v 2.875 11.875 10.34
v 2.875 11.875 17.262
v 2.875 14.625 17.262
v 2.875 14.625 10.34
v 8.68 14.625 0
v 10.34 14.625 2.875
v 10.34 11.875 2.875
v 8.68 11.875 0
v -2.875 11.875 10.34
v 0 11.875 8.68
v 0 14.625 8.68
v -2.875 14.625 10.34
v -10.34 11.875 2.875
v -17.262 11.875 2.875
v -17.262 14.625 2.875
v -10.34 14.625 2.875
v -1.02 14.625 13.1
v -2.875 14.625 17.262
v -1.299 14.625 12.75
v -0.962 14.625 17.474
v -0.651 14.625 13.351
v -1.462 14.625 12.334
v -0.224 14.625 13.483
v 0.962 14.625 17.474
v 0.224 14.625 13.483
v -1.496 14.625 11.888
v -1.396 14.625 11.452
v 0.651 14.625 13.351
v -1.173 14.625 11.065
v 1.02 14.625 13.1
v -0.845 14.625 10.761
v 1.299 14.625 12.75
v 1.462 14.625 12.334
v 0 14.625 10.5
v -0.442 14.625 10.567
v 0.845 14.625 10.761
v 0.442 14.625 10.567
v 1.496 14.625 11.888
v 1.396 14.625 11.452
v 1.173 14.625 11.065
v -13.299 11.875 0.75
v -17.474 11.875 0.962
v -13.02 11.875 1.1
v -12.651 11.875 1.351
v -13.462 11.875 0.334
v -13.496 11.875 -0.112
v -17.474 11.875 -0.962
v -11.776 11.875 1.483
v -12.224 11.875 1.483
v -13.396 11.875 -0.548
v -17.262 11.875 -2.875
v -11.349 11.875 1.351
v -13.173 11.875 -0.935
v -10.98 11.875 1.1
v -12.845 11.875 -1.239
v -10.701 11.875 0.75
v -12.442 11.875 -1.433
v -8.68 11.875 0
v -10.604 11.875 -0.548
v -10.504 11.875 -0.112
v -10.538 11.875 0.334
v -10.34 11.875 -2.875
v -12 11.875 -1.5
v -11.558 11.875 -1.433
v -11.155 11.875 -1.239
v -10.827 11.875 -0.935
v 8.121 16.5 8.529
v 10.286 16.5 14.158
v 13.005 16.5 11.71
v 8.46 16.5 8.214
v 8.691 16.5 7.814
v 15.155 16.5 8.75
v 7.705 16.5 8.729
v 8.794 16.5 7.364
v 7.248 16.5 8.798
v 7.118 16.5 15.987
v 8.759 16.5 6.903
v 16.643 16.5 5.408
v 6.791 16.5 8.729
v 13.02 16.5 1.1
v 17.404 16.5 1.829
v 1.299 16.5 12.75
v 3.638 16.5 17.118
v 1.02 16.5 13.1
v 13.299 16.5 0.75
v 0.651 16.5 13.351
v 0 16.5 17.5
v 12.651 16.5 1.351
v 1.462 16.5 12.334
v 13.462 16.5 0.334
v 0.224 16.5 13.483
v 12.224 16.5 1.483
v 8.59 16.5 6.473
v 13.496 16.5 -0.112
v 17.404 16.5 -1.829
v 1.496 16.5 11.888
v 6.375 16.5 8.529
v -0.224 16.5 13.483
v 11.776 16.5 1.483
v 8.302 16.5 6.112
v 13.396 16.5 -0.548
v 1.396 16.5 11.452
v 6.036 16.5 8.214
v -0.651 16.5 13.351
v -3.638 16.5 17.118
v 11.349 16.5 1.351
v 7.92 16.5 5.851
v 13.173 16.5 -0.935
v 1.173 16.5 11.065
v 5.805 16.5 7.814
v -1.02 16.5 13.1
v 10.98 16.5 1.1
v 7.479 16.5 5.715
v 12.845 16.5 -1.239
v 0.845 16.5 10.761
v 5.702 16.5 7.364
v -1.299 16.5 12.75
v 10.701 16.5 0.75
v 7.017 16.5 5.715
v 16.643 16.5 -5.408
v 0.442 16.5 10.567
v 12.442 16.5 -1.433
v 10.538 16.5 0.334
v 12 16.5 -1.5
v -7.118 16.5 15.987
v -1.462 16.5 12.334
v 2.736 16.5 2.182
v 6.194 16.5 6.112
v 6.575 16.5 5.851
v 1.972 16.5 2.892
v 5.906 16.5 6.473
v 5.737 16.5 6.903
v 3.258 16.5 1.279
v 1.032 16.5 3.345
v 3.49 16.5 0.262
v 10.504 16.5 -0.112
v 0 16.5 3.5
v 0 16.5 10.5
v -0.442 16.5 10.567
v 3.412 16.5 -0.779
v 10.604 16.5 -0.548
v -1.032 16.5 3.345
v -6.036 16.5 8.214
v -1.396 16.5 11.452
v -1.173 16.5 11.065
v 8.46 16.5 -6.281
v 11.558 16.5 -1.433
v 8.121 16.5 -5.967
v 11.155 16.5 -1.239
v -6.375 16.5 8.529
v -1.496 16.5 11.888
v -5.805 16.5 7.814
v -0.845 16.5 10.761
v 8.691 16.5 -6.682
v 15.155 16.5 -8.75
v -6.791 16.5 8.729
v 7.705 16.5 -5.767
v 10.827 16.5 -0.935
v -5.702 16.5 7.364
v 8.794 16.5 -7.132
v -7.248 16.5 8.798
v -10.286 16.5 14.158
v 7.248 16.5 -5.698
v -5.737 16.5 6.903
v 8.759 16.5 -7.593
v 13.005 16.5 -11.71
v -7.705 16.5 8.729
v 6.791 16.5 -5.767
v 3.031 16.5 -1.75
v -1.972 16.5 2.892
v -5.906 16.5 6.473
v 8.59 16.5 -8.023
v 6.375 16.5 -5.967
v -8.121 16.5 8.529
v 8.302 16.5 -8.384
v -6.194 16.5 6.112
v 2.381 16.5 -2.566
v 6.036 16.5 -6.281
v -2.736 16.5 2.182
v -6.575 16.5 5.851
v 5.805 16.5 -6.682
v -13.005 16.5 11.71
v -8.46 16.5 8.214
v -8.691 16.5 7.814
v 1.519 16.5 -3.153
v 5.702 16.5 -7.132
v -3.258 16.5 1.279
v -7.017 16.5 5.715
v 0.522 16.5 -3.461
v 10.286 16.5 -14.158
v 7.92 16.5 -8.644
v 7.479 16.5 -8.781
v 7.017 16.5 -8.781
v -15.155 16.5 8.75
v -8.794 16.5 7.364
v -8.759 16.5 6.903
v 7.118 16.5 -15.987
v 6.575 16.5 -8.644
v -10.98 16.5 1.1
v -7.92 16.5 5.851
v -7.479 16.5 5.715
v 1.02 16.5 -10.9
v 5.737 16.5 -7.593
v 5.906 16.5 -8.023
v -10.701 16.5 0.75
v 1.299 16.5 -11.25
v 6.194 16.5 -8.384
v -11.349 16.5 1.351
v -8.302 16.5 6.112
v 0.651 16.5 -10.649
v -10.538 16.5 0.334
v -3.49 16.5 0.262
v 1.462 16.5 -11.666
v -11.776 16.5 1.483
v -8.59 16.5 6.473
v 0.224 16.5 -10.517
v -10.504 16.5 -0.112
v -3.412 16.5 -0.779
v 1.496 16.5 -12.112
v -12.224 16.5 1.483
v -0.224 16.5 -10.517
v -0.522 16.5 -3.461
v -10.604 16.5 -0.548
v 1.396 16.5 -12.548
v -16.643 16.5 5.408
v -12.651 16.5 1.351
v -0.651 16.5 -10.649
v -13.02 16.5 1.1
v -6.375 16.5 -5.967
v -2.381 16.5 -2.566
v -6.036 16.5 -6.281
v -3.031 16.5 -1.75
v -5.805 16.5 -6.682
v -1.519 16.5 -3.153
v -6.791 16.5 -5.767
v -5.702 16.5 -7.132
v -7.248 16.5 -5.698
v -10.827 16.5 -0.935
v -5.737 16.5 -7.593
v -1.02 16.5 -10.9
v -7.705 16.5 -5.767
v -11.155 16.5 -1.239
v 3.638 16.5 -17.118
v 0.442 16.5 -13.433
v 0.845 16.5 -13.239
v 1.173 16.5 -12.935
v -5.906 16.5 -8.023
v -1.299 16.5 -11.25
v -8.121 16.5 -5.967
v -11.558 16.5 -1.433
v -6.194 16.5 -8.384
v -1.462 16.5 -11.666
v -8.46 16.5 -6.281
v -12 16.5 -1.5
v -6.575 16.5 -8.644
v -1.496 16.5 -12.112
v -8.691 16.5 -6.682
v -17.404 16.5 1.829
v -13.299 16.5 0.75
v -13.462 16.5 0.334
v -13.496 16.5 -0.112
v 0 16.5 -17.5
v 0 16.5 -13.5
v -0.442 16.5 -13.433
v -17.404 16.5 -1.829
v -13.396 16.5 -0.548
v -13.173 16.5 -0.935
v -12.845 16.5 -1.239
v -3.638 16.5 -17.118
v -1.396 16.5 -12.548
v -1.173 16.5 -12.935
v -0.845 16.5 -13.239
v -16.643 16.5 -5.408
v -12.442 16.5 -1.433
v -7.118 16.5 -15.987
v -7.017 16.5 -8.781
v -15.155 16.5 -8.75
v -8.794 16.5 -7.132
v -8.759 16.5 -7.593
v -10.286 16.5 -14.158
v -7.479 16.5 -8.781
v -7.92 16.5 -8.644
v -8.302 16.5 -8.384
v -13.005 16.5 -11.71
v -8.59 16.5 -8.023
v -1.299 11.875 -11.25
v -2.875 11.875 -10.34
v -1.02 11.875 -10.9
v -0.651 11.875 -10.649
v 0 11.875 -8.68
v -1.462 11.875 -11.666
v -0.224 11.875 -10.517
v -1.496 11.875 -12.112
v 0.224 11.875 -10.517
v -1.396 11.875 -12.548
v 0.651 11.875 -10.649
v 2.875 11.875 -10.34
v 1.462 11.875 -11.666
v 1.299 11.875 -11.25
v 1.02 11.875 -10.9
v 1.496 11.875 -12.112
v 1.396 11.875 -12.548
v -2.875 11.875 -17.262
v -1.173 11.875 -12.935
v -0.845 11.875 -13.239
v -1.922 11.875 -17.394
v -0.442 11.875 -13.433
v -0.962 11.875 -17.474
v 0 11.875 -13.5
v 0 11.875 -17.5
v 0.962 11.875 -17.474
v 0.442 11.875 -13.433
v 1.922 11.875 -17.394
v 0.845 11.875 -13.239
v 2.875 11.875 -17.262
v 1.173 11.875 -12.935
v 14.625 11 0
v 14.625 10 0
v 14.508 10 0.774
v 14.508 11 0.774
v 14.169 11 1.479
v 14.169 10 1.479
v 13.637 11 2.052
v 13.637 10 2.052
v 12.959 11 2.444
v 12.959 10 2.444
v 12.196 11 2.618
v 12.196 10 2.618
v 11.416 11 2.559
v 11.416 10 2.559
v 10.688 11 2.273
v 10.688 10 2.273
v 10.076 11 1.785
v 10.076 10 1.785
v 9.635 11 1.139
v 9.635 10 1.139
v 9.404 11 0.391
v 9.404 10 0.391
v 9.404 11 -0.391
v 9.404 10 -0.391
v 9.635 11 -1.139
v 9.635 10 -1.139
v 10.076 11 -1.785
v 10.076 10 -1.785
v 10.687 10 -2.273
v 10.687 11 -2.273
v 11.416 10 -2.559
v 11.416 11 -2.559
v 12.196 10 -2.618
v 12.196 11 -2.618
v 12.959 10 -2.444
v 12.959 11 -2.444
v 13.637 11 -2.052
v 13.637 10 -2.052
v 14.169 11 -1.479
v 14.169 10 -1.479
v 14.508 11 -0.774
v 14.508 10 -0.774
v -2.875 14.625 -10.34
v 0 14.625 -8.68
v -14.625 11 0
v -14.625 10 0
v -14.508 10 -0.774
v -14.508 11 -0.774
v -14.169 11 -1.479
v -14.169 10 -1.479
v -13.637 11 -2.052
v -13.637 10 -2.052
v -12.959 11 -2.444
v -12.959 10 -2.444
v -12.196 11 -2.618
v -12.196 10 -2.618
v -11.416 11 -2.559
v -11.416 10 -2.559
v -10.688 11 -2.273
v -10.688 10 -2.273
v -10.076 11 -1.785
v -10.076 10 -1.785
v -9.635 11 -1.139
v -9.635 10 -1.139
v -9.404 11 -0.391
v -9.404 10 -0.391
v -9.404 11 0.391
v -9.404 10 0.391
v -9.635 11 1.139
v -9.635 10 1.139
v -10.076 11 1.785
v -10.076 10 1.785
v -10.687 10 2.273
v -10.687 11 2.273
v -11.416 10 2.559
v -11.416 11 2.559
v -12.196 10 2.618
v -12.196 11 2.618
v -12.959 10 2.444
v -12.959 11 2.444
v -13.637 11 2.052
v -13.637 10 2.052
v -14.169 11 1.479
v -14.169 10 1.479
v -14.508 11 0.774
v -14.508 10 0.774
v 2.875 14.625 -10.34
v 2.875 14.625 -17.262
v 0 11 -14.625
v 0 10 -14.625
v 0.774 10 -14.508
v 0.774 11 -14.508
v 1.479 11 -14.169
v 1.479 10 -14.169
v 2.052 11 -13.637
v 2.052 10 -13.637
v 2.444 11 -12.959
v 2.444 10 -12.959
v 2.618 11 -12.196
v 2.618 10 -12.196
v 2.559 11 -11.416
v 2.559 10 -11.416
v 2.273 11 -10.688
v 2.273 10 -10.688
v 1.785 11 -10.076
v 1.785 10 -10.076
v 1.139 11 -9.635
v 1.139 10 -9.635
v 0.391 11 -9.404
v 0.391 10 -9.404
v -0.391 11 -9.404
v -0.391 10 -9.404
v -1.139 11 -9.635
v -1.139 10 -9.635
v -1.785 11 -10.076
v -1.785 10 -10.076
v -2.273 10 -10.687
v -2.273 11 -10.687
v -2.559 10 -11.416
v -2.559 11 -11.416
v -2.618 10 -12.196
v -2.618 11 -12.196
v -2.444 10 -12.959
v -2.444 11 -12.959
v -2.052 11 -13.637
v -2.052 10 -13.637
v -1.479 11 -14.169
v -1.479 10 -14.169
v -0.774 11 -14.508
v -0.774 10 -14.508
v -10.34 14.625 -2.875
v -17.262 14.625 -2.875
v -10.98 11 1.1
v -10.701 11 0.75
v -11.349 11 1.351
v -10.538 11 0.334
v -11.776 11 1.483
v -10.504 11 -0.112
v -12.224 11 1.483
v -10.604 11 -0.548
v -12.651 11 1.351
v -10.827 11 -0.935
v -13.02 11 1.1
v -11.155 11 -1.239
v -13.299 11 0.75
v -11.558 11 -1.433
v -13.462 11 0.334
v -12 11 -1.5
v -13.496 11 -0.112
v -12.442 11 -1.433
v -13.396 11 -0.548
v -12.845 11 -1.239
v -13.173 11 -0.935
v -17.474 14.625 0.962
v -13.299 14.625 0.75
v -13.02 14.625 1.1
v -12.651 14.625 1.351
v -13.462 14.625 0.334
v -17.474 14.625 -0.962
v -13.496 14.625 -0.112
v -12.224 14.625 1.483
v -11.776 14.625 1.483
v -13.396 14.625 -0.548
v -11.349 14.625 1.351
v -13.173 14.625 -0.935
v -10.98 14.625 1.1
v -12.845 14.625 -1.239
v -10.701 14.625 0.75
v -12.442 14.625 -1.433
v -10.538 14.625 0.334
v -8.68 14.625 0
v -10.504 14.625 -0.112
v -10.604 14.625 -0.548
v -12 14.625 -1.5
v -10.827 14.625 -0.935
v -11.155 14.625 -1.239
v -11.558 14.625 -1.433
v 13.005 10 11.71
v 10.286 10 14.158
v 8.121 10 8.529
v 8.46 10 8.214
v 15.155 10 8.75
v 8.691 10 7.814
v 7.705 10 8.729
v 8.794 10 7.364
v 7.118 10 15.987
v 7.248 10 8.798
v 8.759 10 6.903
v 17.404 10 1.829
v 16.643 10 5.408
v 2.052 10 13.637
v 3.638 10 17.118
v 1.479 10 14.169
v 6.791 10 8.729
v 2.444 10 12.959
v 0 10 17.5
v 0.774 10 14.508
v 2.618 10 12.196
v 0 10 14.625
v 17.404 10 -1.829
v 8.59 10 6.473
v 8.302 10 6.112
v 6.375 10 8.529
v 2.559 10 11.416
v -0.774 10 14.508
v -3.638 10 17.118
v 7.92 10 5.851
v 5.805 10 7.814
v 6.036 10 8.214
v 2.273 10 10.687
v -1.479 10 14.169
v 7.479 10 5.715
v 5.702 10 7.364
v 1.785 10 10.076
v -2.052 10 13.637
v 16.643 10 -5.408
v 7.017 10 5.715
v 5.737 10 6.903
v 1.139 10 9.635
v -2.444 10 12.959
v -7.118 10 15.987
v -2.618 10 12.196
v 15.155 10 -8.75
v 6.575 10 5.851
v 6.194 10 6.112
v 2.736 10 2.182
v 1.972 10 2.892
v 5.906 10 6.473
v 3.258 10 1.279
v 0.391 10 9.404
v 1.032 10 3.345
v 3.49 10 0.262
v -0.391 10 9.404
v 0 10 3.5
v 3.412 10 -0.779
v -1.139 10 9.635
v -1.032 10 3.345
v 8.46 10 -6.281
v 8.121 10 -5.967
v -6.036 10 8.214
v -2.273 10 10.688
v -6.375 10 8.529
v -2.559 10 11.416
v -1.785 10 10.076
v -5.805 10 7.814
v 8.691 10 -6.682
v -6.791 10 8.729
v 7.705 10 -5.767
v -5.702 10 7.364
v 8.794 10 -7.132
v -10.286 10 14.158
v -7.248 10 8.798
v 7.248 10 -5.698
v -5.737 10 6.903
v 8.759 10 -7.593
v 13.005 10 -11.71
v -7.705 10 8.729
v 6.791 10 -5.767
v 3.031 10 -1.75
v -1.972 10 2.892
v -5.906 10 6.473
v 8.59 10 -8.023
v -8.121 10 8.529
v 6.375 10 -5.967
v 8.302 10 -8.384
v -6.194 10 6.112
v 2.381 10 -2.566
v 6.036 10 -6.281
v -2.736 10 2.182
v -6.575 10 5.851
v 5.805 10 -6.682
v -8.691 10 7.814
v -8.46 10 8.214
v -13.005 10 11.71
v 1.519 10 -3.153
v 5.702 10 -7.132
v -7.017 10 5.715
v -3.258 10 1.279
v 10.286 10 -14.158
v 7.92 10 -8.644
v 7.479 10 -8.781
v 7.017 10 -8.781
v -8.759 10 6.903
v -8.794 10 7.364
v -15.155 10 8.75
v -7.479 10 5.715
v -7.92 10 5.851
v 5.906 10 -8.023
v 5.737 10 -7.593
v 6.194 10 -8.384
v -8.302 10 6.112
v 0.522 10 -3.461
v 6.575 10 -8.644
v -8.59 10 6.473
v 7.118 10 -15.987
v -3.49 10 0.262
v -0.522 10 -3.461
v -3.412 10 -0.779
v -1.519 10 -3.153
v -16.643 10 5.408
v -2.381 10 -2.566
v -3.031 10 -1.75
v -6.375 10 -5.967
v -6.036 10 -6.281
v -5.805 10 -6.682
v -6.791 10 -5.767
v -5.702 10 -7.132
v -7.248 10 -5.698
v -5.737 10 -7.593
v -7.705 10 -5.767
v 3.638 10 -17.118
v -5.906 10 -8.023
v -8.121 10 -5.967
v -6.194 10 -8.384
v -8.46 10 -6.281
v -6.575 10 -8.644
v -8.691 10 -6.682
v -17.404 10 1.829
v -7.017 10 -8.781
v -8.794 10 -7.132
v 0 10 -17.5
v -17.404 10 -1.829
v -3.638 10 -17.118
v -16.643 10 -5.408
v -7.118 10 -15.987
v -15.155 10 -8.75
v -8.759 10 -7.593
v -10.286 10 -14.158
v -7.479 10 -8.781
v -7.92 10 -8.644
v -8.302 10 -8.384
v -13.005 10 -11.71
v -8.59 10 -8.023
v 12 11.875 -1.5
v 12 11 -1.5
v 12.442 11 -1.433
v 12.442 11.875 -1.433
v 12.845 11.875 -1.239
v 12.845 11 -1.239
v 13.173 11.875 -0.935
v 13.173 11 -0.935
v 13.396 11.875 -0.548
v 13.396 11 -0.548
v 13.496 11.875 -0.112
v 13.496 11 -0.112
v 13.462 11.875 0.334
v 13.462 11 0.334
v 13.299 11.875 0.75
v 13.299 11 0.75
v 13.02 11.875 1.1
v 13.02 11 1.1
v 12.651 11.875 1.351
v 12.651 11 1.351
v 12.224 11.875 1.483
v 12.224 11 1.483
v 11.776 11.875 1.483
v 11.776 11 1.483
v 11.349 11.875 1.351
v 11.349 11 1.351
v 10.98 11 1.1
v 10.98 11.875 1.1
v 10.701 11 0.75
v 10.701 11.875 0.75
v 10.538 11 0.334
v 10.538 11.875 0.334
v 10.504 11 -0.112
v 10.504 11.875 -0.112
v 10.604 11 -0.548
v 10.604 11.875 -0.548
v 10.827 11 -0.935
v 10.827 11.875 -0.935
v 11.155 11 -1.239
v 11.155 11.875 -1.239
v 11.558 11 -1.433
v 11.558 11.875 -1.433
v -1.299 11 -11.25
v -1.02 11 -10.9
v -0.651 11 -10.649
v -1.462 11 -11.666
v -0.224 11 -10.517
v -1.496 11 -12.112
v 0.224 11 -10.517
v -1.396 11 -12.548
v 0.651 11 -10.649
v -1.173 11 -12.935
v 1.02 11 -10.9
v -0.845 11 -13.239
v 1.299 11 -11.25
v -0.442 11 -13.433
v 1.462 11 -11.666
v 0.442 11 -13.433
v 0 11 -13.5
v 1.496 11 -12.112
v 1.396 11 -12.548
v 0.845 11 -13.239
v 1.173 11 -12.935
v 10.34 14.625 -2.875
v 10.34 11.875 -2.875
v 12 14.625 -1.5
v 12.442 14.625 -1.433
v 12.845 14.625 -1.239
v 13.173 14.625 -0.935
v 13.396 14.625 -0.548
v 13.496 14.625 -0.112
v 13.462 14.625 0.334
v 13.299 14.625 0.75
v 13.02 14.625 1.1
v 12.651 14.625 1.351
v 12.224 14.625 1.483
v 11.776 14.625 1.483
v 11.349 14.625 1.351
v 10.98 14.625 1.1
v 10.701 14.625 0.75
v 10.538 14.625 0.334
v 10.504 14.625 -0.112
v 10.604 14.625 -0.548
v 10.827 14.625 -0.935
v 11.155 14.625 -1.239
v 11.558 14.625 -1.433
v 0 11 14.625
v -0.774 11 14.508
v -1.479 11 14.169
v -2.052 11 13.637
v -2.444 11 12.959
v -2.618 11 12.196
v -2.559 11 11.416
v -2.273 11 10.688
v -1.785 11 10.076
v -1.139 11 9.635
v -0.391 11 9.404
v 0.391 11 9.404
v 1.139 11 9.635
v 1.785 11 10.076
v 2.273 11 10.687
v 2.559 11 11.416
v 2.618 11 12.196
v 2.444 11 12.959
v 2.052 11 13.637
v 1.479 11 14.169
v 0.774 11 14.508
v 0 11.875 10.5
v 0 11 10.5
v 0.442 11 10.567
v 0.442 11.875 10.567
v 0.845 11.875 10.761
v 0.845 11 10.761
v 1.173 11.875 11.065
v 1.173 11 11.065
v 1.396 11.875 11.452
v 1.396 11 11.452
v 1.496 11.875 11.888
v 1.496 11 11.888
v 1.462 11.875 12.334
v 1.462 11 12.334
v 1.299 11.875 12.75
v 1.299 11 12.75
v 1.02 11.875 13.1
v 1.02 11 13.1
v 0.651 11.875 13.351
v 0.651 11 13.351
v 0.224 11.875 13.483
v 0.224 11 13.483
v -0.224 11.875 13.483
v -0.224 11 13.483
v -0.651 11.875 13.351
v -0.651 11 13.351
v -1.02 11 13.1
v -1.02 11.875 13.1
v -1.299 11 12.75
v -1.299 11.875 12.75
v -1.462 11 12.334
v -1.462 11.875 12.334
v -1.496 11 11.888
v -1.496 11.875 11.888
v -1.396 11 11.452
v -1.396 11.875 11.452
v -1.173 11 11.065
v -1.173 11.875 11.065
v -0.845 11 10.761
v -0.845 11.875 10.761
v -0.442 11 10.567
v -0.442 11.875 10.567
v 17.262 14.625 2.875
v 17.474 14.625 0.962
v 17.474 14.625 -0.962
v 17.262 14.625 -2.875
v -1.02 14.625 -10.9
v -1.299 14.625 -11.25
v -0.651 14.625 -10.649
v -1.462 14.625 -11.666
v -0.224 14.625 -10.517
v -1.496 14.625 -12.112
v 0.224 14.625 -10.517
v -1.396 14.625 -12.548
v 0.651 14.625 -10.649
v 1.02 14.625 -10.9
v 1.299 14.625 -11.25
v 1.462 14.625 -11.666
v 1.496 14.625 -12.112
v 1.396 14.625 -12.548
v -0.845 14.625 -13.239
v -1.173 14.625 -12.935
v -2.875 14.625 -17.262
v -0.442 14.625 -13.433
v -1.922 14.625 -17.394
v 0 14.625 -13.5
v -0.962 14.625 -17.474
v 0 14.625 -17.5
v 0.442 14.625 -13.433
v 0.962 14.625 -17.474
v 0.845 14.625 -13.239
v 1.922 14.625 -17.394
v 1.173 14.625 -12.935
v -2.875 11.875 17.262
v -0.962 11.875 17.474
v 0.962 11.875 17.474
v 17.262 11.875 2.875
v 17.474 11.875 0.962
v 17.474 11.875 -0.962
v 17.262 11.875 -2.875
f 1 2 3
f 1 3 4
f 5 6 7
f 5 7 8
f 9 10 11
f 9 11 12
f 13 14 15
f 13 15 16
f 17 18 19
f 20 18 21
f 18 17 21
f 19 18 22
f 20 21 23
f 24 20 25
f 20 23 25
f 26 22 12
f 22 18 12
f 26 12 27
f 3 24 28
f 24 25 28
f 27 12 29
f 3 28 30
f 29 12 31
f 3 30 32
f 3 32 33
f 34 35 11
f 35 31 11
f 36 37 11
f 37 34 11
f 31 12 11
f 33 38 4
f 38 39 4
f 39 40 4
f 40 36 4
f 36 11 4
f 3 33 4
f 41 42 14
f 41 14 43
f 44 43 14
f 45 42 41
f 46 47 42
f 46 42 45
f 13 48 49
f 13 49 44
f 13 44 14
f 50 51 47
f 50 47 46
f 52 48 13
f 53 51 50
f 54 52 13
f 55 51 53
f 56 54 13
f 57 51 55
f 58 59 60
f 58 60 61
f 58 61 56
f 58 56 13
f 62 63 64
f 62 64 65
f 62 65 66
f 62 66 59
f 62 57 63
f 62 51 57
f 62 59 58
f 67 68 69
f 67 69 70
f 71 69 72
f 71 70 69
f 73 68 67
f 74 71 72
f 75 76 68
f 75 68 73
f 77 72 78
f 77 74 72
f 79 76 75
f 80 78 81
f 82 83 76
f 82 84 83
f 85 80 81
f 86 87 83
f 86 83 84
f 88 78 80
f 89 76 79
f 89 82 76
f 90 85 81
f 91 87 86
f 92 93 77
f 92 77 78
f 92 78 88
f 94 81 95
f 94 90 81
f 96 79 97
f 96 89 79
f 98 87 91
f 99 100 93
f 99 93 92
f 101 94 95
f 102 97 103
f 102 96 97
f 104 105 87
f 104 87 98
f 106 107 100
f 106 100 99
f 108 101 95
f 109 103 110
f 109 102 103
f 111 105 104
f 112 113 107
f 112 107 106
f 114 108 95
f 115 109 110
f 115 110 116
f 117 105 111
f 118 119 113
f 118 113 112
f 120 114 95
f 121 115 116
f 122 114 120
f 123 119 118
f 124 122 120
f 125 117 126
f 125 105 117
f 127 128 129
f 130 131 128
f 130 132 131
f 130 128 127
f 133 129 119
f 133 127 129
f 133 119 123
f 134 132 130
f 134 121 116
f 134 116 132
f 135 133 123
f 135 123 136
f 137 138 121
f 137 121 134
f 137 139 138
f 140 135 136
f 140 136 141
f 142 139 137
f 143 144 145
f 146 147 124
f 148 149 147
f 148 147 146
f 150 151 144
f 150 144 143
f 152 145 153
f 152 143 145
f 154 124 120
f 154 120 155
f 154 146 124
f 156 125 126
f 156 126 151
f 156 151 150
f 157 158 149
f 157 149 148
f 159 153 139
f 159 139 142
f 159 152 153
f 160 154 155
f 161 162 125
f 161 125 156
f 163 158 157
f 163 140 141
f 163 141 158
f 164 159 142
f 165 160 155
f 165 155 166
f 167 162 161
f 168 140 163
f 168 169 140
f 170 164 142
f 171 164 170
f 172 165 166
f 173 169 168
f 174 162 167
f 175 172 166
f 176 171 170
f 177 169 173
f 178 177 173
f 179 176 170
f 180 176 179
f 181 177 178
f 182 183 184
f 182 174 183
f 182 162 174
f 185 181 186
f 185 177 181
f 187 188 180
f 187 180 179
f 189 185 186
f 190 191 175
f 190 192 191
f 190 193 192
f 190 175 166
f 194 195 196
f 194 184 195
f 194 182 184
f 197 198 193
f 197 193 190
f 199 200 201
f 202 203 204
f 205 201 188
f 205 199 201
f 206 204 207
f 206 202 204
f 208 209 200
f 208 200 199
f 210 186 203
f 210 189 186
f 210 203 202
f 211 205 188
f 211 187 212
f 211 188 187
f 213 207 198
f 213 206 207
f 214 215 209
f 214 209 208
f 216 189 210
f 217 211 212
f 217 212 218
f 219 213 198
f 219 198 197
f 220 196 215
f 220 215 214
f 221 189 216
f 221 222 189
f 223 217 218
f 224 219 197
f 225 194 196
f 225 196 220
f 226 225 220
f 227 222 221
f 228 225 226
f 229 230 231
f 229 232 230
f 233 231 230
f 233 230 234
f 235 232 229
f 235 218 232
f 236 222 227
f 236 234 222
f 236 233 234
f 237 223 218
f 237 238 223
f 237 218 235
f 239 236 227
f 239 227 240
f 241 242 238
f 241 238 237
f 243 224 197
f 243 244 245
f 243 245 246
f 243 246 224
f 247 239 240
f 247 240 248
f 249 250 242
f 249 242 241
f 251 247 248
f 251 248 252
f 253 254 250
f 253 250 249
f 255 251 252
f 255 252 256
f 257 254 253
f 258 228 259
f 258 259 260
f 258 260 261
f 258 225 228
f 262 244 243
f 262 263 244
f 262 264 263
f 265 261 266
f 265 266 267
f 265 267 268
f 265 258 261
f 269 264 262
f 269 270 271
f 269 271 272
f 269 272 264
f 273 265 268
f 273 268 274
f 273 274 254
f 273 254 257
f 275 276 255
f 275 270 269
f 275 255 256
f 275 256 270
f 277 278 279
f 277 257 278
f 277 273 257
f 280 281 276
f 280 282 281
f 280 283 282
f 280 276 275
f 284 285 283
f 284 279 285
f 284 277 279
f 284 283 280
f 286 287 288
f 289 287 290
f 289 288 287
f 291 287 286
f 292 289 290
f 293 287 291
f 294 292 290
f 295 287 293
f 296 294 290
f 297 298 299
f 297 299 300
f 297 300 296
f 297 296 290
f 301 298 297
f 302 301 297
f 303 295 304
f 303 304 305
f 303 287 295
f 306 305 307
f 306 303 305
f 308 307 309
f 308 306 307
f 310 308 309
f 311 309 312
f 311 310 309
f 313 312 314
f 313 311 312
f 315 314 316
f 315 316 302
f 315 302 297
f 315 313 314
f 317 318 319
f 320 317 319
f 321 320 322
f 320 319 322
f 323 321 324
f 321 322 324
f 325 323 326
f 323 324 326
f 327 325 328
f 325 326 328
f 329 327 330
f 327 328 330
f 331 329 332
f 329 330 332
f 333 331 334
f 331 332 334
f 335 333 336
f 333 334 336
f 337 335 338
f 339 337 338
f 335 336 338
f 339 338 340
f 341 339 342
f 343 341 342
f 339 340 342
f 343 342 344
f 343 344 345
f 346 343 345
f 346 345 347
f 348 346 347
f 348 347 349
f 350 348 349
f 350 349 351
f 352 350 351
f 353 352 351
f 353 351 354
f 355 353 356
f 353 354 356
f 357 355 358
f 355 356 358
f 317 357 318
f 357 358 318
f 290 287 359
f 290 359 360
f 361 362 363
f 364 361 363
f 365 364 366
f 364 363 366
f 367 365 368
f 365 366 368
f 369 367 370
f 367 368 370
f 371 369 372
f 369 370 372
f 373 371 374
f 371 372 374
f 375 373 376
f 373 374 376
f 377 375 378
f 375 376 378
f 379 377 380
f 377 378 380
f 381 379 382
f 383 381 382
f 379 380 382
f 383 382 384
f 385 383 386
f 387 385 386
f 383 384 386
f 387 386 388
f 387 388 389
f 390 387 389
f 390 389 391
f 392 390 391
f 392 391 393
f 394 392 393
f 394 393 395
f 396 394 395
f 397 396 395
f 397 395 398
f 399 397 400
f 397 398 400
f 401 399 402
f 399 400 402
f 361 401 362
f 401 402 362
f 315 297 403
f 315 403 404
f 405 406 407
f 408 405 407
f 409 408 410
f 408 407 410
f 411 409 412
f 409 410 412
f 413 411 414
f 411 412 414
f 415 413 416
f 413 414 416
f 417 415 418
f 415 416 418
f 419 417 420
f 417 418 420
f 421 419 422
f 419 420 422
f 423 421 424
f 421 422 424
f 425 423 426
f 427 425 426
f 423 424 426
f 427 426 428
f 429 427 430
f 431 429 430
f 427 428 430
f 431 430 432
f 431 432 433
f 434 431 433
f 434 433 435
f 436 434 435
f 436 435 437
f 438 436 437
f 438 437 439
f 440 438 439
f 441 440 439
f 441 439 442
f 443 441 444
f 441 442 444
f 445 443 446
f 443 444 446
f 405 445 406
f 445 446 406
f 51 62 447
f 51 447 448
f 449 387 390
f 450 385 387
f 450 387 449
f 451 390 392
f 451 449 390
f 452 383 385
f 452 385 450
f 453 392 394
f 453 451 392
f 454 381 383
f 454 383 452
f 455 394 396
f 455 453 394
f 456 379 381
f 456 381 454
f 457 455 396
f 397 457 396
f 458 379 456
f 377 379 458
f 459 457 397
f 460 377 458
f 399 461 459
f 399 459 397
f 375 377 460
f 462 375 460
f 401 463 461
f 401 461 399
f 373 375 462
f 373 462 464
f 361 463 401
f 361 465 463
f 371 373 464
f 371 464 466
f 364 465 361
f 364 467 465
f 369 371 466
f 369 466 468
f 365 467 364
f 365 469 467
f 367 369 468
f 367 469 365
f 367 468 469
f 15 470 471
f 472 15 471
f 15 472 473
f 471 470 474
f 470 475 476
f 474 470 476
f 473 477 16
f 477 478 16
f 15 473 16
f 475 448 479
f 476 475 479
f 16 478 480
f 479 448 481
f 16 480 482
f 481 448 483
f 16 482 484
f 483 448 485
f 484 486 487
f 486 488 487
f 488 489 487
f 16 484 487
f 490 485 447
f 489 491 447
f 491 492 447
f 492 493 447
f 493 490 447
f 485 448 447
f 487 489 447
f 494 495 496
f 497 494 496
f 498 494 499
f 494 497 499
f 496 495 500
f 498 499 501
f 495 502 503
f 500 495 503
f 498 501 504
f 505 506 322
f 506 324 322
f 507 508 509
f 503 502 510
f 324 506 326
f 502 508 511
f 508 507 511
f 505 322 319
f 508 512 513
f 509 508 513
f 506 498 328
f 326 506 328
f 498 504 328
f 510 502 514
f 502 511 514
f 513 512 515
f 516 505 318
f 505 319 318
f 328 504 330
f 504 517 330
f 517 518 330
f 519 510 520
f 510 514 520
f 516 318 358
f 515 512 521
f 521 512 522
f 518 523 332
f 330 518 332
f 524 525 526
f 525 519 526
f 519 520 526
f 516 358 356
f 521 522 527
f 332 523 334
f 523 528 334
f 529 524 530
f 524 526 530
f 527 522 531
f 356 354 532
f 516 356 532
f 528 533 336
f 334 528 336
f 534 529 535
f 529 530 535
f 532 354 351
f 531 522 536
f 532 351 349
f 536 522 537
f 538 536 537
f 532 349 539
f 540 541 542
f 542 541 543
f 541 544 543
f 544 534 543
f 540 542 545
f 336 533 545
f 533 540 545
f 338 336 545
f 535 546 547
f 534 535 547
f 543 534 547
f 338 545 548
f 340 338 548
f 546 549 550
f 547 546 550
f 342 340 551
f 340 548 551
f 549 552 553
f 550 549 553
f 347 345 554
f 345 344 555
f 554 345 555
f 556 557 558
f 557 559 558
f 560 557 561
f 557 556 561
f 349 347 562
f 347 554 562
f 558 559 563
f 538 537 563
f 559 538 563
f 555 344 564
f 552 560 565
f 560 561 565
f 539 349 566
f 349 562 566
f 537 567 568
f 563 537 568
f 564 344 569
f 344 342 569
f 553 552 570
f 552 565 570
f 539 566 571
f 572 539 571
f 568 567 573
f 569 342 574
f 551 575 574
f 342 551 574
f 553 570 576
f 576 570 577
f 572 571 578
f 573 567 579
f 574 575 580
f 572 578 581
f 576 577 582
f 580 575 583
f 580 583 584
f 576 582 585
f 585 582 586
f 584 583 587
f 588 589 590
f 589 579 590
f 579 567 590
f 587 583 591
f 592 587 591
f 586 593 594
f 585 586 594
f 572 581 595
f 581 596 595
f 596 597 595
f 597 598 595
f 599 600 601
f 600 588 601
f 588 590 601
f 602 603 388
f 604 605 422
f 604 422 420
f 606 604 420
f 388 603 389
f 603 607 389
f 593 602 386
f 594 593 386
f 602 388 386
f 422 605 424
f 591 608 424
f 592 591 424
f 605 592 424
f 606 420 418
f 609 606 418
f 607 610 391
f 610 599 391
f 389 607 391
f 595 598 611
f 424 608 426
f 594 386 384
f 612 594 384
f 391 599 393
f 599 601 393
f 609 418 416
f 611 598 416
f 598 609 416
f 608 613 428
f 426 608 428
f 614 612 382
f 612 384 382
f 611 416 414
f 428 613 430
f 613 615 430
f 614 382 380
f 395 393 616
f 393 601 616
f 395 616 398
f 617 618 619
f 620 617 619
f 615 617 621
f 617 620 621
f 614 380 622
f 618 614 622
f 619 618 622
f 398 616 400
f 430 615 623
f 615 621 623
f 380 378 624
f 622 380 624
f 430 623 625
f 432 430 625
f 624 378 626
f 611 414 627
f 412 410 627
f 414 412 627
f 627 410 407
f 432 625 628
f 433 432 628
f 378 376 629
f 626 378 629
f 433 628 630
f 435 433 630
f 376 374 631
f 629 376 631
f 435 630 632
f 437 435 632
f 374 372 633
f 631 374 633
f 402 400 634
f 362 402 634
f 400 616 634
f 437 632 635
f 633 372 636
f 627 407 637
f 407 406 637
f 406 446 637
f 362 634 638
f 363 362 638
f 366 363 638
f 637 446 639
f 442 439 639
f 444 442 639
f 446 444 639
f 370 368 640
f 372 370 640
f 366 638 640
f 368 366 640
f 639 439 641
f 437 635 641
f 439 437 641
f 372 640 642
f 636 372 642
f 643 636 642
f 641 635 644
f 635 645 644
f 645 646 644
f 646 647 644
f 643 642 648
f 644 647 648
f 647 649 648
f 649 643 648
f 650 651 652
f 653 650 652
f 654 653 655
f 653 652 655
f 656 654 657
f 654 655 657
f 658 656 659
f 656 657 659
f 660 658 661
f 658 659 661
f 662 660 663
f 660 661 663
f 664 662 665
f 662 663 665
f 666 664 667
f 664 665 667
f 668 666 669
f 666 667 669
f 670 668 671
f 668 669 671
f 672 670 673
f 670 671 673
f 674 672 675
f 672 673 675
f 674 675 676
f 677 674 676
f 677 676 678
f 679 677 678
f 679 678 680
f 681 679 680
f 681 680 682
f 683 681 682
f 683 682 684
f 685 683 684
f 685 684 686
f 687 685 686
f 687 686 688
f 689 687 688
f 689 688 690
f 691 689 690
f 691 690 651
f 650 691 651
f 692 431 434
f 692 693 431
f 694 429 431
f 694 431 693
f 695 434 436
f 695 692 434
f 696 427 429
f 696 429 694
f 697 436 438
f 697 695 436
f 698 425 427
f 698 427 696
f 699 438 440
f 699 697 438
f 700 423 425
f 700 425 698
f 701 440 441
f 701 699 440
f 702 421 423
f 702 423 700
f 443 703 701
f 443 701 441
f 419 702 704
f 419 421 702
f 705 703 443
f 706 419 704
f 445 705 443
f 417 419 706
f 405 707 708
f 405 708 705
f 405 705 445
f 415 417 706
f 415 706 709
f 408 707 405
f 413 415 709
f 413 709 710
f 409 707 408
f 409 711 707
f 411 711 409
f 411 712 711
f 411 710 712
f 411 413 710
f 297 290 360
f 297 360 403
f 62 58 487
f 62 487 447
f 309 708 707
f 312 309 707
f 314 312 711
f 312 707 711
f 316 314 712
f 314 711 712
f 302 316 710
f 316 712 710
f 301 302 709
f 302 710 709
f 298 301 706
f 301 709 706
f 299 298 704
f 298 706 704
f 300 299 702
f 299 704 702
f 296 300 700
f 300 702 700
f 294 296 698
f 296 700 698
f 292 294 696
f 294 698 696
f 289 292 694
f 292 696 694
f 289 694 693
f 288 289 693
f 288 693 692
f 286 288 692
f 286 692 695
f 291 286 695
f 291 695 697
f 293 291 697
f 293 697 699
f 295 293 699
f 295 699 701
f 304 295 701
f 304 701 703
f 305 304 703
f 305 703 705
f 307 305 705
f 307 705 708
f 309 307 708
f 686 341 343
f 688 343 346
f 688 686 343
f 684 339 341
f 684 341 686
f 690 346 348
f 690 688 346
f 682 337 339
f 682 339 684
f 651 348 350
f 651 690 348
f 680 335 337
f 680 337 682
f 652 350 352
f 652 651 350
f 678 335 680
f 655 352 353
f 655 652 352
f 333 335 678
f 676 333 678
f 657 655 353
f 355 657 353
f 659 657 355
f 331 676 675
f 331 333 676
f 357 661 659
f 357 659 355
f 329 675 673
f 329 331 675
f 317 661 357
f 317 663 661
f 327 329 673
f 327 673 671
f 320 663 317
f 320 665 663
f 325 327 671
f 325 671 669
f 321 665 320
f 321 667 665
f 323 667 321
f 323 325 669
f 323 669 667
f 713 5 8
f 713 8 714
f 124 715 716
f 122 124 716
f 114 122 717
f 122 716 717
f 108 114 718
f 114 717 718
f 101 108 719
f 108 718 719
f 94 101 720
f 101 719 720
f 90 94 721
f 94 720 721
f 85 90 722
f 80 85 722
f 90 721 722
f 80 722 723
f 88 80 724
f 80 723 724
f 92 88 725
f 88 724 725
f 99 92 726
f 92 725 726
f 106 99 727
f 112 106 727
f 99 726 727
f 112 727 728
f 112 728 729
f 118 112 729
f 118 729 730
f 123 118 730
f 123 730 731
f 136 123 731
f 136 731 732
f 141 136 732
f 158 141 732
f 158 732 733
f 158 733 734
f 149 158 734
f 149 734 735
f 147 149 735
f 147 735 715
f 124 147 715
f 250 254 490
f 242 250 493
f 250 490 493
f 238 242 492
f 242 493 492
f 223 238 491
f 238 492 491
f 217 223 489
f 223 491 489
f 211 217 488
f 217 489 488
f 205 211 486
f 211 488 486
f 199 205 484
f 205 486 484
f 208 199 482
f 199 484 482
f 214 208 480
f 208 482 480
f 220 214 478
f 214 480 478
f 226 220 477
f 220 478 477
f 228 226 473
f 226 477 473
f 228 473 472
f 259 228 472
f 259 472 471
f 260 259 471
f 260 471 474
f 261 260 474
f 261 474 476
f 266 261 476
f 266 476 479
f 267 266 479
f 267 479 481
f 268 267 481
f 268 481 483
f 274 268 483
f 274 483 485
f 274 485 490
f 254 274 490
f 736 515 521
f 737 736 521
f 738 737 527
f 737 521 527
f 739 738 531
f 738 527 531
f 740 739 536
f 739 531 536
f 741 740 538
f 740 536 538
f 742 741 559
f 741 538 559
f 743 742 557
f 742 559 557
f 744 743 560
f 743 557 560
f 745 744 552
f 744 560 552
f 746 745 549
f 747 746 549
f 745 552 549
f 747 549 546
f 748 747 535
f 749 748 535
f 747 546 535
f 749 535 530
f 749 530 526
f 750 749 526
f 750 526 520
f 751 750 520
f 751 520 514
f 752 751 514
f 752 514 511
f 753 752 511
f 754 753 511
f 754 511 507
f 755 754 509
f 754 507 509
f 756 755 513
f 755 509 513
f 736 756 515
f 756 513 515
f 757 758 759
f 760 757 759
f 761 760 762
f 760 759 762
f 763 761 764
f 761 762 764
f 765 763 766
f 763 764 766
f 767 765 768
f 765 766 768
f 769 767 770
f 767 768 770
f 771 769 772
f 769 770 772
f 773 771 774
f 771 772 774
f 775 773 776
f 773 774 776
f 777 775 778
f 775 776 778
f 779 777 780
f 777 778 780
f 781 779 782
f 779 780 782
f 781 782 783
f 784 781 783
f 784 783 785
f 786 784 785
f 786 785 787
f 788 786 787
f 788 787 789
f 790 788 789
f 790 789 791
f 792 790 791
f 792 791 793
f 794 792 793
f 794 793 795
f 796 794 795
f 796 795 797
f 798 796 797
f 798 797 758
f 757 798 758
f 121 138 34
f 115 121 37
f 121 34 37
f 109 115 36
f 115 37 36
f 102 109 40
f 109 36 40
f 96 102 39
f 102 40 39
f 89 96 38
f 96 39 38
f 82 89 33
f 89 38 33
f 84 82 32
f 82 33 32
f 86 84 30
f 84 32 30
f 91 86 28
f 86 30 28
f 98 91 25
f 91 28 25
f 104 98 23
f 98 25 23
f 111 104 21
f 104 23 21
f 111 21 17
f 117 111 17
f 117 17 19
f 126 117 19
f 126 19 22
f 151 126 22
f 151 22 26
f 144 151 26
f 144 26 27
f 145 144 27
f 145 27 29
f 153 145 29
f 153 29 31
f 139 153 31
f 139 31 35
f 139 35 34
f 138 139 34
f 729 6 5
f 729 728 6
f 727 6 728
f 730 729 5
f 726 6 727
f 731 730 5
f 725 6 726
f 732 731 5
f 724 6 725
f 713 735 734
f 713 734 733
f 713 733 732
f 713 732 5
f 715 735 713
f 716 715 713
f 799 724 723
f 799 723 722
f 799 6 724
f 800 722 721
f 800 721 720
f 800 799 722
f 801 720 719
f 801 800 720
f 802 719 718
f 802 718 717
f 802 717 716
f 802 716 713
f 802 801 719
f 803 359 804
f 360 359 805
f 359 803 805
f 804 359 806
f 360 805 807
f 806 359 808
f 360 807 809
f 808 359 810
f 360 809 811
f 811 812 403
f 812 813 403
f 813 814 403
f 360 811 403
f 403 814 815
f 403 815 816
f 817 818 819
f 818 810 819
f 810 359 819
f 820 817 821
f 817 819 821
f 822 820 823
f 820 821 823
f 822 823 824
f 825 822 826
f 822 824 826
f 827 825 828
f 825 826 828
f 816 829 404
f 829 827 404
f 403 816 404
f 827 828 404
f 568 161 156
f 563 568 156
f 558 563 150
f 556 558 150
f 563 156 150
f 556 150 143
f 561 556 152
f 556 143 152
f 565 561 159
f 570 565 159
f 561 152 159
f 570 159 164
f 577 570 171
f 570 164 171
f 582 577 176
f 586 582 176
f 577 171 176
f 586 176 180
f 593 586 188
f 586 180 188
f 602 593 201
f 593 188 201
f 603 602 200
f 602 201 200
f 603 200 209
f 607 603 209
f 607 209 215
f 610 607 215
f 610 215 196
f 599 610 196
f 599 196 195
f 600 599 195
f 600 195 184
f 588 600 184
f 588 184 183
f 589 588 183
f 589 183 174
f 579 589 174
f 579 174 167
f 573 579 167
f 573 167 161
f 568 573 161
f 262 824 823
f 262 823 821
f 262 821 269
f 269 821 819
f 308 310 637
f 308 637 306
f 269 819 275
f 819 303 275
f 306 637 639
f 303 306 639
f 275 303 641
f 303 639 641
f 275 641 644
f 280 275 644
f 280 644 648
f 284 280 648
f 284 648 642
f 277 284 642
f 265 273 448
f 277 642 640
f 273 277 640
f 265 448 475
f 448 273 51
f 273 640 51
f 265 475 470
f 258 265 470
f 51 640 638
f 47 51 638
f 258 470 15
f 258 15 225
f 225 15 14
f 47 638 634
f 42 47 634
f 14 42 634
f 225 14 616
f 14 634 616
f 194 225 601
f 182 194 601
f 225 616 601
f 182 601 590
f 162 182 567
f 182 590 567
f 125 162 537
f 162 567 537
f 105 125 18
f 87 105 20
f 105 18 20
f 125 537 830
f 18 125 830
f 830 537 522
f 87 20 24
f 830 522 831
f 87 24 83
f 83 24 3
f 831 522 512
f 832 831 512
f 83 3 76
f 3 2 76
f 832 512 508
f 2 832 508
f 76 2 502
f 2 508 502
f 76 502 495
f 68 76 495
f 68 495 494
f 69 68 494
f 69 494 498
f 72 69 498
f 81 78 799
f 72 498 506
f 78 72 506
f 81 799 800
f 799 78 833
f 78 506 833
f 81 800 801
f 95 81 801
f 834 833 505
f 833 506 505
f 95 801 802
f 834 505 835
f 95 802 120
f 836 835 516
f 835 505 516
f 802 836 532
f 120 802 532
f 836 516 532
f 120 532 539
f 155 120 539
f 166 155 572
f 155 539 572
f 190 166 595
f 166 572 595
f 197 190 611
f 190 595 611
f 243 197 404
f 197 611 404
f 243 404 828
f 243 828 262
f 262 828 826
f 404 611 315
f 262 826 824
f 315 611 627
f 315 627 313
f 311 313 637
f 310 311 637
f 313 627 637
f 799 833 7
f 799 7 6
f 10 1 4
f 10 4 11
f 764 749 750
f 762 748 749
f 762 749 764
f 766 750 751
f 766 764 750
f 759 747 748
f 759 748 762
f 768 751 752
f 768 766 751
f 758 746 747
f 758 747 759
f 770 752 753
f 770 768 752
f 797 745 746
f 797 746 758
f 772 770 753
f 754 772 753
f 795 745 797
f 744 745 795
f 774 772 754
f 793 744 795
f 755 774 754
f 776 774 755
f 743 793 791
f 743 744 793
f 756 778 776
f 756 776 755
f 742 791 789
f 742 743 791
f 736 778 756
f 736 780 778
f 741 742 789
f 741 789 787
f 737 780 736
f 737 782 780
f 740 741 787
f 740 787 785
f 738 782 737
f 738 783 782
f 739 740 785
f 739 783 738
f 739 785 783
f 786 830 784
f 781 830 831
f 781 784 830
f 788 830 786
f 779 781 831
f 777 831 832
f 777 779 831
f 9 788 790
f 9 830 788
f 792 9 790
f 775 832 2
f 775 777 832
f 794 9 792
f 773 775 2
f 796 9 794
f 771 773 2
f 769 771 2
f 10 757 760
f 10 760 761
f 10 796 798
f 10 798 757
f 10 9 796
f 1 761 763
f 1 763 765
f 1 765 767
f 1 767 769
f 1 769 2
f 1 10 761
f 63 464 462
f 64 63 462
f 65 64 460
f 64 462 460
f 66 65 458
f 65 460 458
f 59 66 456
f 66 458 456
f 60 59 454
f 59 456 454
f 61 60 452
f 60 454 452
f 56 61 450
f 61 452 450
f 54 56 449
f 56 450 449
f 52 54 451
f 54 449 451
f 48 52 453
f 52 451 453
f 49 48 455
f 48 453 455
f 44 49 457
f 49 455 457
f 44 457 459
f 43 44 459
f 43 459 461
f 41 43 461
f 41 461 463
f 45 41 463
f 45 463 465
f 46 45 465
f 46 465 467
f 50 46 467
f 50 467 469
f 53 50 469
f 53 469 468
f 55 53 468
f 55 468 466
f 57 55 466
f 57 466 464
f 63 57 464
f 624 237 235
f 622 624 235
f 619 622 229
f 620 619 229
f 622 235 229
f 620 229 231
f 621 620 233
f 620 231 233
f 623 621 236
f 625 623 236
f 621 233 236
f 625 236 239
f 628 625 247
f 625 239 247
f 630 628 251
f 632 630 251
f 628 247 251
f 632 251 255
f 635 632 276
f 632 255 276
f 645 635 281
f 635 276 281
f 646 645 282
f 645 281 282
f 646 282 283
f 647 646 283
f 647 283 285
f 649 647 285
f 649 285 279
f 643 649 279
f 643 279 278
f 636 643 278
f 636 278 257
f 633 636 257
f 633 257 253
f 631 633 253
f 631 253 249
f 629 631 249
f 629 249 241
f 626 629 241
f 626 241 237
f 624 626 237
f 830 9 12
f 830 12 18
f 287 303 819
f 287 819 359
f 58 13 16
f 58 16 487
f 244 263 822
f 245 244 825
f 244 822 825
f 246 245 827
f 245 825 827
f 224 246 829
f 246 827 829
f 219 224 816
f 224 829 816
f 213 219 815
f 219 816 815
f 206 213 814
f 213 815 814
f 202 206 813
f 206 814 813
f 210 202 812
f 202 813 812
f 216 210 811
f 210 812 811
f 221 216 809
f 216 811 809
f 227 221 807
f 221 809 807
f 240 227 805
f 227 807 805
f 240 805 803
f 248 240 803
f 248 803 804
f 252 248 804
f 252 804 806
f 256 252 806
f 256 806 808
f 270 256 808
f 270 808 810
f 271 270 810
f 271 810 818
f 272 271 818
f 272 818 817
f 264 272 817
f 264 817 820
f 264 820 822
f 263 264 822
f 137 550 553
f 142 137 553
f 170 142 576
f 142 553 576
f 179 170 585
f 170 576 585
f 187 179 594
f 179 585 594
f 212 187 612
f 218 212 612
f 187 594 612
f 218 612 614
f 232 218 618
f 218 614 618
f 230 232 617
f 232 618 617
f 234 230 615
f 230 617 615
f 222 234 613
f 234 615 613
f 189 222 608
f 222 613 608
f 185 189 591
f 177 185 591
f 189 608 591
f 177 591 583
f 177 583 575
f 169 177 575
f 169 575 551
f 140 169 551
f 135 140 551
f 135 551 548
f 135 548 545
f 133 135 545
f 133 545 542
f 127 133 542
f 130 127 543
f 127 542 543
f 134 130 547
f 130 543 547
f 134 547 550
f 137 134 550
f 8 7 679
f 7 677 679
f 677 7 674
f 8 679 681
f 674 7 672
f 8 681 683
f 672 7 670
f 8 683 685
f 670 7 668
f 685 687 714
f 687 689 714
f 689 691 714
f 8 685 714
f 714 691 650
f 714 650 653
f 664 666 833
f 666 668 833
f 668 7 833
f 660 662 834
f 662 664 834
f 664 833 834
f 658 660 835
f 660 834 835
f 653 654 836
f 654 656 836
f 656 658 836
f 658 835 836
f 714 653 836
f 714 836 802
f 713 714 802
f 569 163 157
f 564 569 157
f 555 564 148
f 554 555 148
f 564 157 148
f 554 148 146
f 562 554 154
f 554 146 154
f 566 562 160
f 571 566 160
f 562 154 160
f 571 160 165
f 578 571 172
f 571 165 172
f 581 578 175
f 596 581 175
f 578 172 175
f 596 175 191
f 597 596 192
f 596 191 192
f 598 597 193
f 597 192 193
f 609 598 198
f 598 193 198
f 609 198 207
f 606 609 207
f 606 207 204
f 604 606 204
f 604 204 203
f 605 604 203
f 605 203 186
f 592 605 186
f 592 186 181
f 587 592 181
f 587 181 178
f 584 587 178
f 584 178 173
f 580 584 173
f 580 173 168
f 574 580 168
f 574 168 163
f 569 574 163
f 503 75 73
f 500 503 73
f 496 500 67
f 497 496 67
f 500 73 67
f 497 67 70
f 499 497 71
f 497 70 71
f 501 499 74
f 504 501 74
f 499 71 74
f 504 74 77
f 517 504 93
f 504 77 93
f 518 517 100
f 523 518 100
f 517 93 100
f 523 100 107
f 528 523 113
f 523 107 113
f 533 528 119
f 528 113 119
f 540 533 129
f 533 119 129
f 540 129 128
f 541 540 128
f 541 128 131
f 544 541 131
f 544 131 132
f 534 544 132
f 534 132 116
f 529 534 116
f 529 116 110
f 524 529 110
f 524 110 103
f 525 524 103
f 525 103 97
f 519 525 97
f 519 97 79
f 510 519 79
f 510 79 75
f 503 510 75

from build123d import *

# Parameters (mm, degrees)
SKETCH1_R                      = 6.05
SKETCH1_R_2                    = 3.05
BOSS_EXTRUDE1_DEPTH            = 10
SKETCH2_R                      = 17.5
BOSS_EXTRUDE2_DEPTH            = 6.5
CUT_EXTRUDE1_REACH             = 28.693
SKETCH3_R                      = 1.5
CUT_EXTRUDE2_DEPTH             = 30.744747435
CUT_EXTRUDE2_DEPTH_BACK        = 30.744747435
SKETCH4_R                      = 1.5
CUT_EXTRUDE3_REACH             = 28.693
SKETCH6_R                      = 3.5
CUT_EXTRUDE3_DIRECTION_2_REACH = 28.693
SKETCH8_W                      = 5.75
SKETCH8_H                      = 2.75
CUT_EXTRUDE4_DEPTH             = 5
CUT_EXTRUDE5_DEPTH             = 2.75
CIRPATTERN1_START              = 11.875
CIRPATTERN1_OUTLINE_R          = 1.5
CIRPATTERN1_DEPTH              = 2.75
SKETCH10_R                     = 6.05
CUT_EXTRUDE6_DEPTH             = 10
SKETCH11_R                     = 1.55
CUT_EXTRUDE7_DEPTH             = 10
SKETCH12_R                     = 2.625
CUT_EXTRUDE8_DEPTH             = 1
CIRPATTERN2_COUNT              = 4


# Read off the part's stored shape, not the designer's step: CirPattern1
with BuildPart() as part:
    # Sketch1 → Boss-Extrude1 (new body)
    with BuildSketch(Plane(origin=(0, 0, 0), x_dir=(1, 0, 0), z_dir=(0, 1, 0))):
        with Locations(Location((0, 0, 0), (0, 0, 270))):
            Circle(SKETCH1_R)
        with Locations(Location((0, 0, 0), (0, 0, 270))):
            Circle(SKETCH1_R_2, mode=Mode.SUBTRACT)
    extrude(amount=BOSS_EXTRUDE1_DEPTH)

    # Sketch2 → Boss-Extrude2 (add)
    with BuildSketch(Plane(origin=(0, 10, 0), x_dir=(1, 0, 0), z_dir=(0, 1, 0))):
        with Locations(Location((0, 0, 0), (0, 0, 90))):
            Circle(SKETCH2_R)
    extrude(amount=BOSS_EXTRUDE2_DEPTH)

    # Sketch3 → Cut-Extrude1 (cut, up to next)
    with BuildSketch(Plane.XZ.offset(-10), mode=Mode.PRIVATE) as cut_extrude1_sk1:
        with Locations(Location((12, 0, 0), (0, 0, 270))):
            Circle(SKETCH3_R)
    cut_extrude1_tool1 = extrude(cut_extrude1_sk1.sketch, amount=-CUT_EXTRUDE1_REACH, mode=Mode.PRIVATE) & part.part
    # Sketch3 → Cut-Extrude1 (cut, up to next)
    with BuildSketch(Plane.XZ.offset(-10), mode=Mode.PRIVATE) as cut_extrude1_sk2:
        with Locations(Location((0, -12, 0), (0, 0, 270))):
            Circle(SKETCH3_R)
    cut_extrude1_tool2 = extrude(cut_extrude1_sk2.sketch, amount=-CUT_EXTRUDE1_REACH, mode=Mode.PRIVATE) & part.part
    # Sketch3 → Cut-Extrude1 (cut, up to next)
    with BuildSketch(Plane.XZ.offset(-10), mode=Mode.PRIVATE) as cut_extrude1_sk3:
        with Locations(Location((-12, 0, 0), (0, 0, 270))):
            Circle(SKETCH3_R)
    cut_extrude1_tool3 = extrude(cut_extrude1_sk3.sketch, amount=-CUT_EXTRUDE1_REACH, mode=Mode.PRIVATE) & part.part
    # Sketch3 → Cut-Extrude1 (cut, up to next)
    with BuildSketch(Plane.XZ.offset(-10), mode=Mode.PRIVATE) as cut_extrude1_sk4:
        with Locations(Location((0, 12, 0), (0, 0, 270))):
            Circle(SKETCH3_R)
    cut_extrude1_tool4 = extrude(cut_extrude1_sk4.sketch, amount=-CUT_EXTRUDE1_REACH, mode=Mode.PRIVATE) & part.part
    add(cut_extrude1_tool1.solids().sort_by_distance((12, 10, 0))[0], mode=Mode.SUBTRACT)
    add(cut_extrude1_tool2.solids().sort_by_distance((0, 10, -12))[0], mode=Mode.SUBTRACT)
    add(cut_extrude1_tool3.solids().sort_by_distance((-12, 10, 0))[0], mode=Mode.SUBTRACT)
    add(cut_extrude1_tool4.solids().sort_by_distance((0, 10, 12))[0], mode=Mode.SUBTRACT)

    # Sketch4 → Cut-Extrude2 (cut, two sides: drawn at the far end of the back side and taken through both)
    with BuildSketch(Plane.XY.offset(-CUT_EXTRUDE2_DEPTH_BACK)):
        with Locations((0, 4.916404418)):
            Circle(SKETCH4_R)
    extrude(amount=CUT_EXTRUDE2_DEPTH + CUT_EXTRUDE2_DEPTH_BACK, mode=Mode.SUBTRACT)

    # Sketch6 → Cut-Extrude3 (cut, up to next)
    with BuildSketch(Plane(origin=(0, 10, 0), x_dir=(-1, 0, 0), z_dir=(0, -1, 0)), mode=Mode.PRIVATE) as cut_extrude3_sk1:
        with Locations(Location((0, 0, 0), (0, 0, 270))):
            Circle(SKETCH6_R)
    cut_extrude3_tool1 = extrude(cut_extrude3_sk1.sketch, amount=-CUT_EXTRUDE3_REACH, mode=Mode.PRIVATE) & part.part
    add(cut_extrude3_tool1.solids().sort_by_distance((0, 10, 0))[0], mode=Mode.SUBTRACT)

    # Sketch6 → Cut-Extrude3 direction 2 (cut, up to next)
    with BuildSketch(Plane(origin=(0, 10, 0), x_dir=(-1, 0, 0), z_dir=(0, -1, 0)), mode=Mode.PRIVATE) as cut_extrude3_direction_2_sk1:
        with Locations(Location((0, 0, 0), (0, 0, 270))):
            Circle(SKETCH6_R)
    cut_extrude3_direction_2_tool1 = extrude(cut_extrude3_direction_2_sk1.sketch, amount=CUT_EXTRUDE3_DIRECTION_2_REACH, mode=Mode.PRIVATE) & part.part
    add(cut_extrude3_direction_2_tool1.solids().sort_by_distance((0, 10, 0))[0], mode=Mode.SUBTRACT)

    # Sketch8 → Cut-Extrude4 (cut)
    with BuildSketch(Plane(origin=(17.5, 0, 0), x_dir=(0, 0, -1), z_dir=(1, 0, 0))):
        with Locations((0, 13.25)):
            Rectangle(SKETCH8_W, SKETCH8_H)
    extrude(amount=-CUT_EXTRUDE4_DEPTH, mode=Mode.SUBTRACT)

    # Sketch9 → Cut-Extrude5 (cut)
    with BuildSketch(Plane.XZ.offset(-14.625)):
        Polygon((15.319764048, 0), (13.659882024, 2.875), (10.340117976, 2.875), (8.680235952, 0), (10.340117976, -2.875), (13.659882024, -2.875), align=None)
    extrude(amount=CUT_EXTRUDE5_DEPTH, mode=Mode.SUBTRACT)

    # CirPattern1 outline → CirPattern1 (cut)
    # profile 1 of 3: a face of its own
    with BuildSketch(Plane(origin=(0, 0, 0), x_dir=(1, 0, 0), z_dir=(0, 1, 0)).offset(CIRPATTERN1_START)):
        with BuildLine():
            Line((-8.680235952, 0), (-10.340117976, 2.875))
            Line((-10.340117976, 2.875), (-17.26222393, 2.875))
            ThreePointArc((-17.26222393, 2.875), (-17.5, 0), (-17.26222393, -2.875))
            Line((-17.26222393, -2.875), (-10.340117976, -2.875))
            Line((-10.340117976, -2.875), (-8.680235952, 0))
        make_face()
        with Locations((-12, 0)):
            Circle(CIRPATTERN1_OUTLINE_R, mode=Mode.SUBTRACT)
    # profile 2 of 3: a face of its own
    with BuildSketch(Plane(origin=(0, 0, 0), x_dir=(1, 0, 0), z_dir=(0, 1, 0)).offset(CIRPATTERN1_START)):
        with BuildLine():
            ThreePointArc((2.875, 17.26222393), (0, 17.5), (-2.875, 17.26222393))
            Line((-2.875, 17.26222393), (-2.875, 10.340117976))
            Line((-2.875, 10.340117976), (0, 8.680235952))
            Line((0, 8.680235952), (2.875, 10.340117976))
            Line((2.875, 10.340117976), (2.875, 17.26222393))
        make_face()
        with Locations((0, 12)):
            Circle(CIRPATTERN1_OUTLINE_R, mode=Mode.SUBTRACT)
    # profile 3 of 3: a face of its own
    with BuildSketch(Plane(origin=(0, 0, 0), x_dir=(1, 0, 0), z_dir=(0, 1, 0)).offset(CIRPATTERN1_START)):
        with BuildLine():
            Line((-2.875, -10.340117976), (-2.875, -17.26222393))
            ThreePointArc((-2.875, -17.26222393), (0, -17.5), (2.875, -17.26222393))
            Line((2.875, -17.26222393), (2.875, -10.340117976))
            Line((2.875, -10.340117976), (0, -8.680235952))
            Line((0, -8.680235952), (-2.875, -10.340117976))
        make_face()
        with Locations((0, -12)):
            Circle(CIRPATTERN1_OUTLINE_R, mode=Mode.SUBTRACT)
    extrude(amount=CIRPATTERN1_DEPTH, mode=Mode.SUBTRACT)

    # Sketch10 → Cut-Extrude6 (cut)
    with BuildSketch(Plane.XZ):
        Circle(SKETCH10_R)
    extrude(amount=-CUT_EXTRUDE6_DEPTH, mode=Mode.SUBTRACT)

    # Sketch11 → Cut-Extrude7 (cut)
    with BuildSketch(Plane(origin=(0, 16.5, 0), x_dir=(1, 0, 0), z_dir=(0, 1, 0))):
        with Locations(Location((-7.247844507, -7.247844507, 0), (0, 0, 270))):
            Circle(SKETCH11_R)
        with Locations(Location((-7.247844507, 7.247844507, 0), (0, 0, 270))):
            Circle(SKETCH11_R)
        with Locations(Location((7.247844507, 7.247844507, 0), (0, 0, 270))):
            Circle(SKETCH11_R)
        with Locations(Location((7.247844507, -7.247844507, 0), (0, 0, 270))):
            Circle(SKETCH11_R)
    extrude(amount=-CUT_EXTRUDE7_DEPTH, mode=Mode.SUBTRACT)

    # Sketch12 → Cut-Extrude8 (cut)
    with BuildSketch(Plane.XZ.offset(-10)):
        with Locations(Location((0, -12, 0), (0, 0, 270))):
            Circle(SKETCH12_R)
    cut_extrude8 = extrude(amount=-CUT_EXTRUDE8_DEPTH, mode=Mode.SUBTRACT)

    # CirPattern2: Cut-Extrude8 ×4 about axis
    cirpattern2_axis = Axis((0, 0, 0), (0, 1, 0))
    for i in range(1, CIRPATTERN2_COUNT):
        add(cut_extrude8.rotate(cirpattern2_axis, i * 360 / CIRPATTERN2_COUNT), mode=Mode.SUBTRACT)


solid = part.part
